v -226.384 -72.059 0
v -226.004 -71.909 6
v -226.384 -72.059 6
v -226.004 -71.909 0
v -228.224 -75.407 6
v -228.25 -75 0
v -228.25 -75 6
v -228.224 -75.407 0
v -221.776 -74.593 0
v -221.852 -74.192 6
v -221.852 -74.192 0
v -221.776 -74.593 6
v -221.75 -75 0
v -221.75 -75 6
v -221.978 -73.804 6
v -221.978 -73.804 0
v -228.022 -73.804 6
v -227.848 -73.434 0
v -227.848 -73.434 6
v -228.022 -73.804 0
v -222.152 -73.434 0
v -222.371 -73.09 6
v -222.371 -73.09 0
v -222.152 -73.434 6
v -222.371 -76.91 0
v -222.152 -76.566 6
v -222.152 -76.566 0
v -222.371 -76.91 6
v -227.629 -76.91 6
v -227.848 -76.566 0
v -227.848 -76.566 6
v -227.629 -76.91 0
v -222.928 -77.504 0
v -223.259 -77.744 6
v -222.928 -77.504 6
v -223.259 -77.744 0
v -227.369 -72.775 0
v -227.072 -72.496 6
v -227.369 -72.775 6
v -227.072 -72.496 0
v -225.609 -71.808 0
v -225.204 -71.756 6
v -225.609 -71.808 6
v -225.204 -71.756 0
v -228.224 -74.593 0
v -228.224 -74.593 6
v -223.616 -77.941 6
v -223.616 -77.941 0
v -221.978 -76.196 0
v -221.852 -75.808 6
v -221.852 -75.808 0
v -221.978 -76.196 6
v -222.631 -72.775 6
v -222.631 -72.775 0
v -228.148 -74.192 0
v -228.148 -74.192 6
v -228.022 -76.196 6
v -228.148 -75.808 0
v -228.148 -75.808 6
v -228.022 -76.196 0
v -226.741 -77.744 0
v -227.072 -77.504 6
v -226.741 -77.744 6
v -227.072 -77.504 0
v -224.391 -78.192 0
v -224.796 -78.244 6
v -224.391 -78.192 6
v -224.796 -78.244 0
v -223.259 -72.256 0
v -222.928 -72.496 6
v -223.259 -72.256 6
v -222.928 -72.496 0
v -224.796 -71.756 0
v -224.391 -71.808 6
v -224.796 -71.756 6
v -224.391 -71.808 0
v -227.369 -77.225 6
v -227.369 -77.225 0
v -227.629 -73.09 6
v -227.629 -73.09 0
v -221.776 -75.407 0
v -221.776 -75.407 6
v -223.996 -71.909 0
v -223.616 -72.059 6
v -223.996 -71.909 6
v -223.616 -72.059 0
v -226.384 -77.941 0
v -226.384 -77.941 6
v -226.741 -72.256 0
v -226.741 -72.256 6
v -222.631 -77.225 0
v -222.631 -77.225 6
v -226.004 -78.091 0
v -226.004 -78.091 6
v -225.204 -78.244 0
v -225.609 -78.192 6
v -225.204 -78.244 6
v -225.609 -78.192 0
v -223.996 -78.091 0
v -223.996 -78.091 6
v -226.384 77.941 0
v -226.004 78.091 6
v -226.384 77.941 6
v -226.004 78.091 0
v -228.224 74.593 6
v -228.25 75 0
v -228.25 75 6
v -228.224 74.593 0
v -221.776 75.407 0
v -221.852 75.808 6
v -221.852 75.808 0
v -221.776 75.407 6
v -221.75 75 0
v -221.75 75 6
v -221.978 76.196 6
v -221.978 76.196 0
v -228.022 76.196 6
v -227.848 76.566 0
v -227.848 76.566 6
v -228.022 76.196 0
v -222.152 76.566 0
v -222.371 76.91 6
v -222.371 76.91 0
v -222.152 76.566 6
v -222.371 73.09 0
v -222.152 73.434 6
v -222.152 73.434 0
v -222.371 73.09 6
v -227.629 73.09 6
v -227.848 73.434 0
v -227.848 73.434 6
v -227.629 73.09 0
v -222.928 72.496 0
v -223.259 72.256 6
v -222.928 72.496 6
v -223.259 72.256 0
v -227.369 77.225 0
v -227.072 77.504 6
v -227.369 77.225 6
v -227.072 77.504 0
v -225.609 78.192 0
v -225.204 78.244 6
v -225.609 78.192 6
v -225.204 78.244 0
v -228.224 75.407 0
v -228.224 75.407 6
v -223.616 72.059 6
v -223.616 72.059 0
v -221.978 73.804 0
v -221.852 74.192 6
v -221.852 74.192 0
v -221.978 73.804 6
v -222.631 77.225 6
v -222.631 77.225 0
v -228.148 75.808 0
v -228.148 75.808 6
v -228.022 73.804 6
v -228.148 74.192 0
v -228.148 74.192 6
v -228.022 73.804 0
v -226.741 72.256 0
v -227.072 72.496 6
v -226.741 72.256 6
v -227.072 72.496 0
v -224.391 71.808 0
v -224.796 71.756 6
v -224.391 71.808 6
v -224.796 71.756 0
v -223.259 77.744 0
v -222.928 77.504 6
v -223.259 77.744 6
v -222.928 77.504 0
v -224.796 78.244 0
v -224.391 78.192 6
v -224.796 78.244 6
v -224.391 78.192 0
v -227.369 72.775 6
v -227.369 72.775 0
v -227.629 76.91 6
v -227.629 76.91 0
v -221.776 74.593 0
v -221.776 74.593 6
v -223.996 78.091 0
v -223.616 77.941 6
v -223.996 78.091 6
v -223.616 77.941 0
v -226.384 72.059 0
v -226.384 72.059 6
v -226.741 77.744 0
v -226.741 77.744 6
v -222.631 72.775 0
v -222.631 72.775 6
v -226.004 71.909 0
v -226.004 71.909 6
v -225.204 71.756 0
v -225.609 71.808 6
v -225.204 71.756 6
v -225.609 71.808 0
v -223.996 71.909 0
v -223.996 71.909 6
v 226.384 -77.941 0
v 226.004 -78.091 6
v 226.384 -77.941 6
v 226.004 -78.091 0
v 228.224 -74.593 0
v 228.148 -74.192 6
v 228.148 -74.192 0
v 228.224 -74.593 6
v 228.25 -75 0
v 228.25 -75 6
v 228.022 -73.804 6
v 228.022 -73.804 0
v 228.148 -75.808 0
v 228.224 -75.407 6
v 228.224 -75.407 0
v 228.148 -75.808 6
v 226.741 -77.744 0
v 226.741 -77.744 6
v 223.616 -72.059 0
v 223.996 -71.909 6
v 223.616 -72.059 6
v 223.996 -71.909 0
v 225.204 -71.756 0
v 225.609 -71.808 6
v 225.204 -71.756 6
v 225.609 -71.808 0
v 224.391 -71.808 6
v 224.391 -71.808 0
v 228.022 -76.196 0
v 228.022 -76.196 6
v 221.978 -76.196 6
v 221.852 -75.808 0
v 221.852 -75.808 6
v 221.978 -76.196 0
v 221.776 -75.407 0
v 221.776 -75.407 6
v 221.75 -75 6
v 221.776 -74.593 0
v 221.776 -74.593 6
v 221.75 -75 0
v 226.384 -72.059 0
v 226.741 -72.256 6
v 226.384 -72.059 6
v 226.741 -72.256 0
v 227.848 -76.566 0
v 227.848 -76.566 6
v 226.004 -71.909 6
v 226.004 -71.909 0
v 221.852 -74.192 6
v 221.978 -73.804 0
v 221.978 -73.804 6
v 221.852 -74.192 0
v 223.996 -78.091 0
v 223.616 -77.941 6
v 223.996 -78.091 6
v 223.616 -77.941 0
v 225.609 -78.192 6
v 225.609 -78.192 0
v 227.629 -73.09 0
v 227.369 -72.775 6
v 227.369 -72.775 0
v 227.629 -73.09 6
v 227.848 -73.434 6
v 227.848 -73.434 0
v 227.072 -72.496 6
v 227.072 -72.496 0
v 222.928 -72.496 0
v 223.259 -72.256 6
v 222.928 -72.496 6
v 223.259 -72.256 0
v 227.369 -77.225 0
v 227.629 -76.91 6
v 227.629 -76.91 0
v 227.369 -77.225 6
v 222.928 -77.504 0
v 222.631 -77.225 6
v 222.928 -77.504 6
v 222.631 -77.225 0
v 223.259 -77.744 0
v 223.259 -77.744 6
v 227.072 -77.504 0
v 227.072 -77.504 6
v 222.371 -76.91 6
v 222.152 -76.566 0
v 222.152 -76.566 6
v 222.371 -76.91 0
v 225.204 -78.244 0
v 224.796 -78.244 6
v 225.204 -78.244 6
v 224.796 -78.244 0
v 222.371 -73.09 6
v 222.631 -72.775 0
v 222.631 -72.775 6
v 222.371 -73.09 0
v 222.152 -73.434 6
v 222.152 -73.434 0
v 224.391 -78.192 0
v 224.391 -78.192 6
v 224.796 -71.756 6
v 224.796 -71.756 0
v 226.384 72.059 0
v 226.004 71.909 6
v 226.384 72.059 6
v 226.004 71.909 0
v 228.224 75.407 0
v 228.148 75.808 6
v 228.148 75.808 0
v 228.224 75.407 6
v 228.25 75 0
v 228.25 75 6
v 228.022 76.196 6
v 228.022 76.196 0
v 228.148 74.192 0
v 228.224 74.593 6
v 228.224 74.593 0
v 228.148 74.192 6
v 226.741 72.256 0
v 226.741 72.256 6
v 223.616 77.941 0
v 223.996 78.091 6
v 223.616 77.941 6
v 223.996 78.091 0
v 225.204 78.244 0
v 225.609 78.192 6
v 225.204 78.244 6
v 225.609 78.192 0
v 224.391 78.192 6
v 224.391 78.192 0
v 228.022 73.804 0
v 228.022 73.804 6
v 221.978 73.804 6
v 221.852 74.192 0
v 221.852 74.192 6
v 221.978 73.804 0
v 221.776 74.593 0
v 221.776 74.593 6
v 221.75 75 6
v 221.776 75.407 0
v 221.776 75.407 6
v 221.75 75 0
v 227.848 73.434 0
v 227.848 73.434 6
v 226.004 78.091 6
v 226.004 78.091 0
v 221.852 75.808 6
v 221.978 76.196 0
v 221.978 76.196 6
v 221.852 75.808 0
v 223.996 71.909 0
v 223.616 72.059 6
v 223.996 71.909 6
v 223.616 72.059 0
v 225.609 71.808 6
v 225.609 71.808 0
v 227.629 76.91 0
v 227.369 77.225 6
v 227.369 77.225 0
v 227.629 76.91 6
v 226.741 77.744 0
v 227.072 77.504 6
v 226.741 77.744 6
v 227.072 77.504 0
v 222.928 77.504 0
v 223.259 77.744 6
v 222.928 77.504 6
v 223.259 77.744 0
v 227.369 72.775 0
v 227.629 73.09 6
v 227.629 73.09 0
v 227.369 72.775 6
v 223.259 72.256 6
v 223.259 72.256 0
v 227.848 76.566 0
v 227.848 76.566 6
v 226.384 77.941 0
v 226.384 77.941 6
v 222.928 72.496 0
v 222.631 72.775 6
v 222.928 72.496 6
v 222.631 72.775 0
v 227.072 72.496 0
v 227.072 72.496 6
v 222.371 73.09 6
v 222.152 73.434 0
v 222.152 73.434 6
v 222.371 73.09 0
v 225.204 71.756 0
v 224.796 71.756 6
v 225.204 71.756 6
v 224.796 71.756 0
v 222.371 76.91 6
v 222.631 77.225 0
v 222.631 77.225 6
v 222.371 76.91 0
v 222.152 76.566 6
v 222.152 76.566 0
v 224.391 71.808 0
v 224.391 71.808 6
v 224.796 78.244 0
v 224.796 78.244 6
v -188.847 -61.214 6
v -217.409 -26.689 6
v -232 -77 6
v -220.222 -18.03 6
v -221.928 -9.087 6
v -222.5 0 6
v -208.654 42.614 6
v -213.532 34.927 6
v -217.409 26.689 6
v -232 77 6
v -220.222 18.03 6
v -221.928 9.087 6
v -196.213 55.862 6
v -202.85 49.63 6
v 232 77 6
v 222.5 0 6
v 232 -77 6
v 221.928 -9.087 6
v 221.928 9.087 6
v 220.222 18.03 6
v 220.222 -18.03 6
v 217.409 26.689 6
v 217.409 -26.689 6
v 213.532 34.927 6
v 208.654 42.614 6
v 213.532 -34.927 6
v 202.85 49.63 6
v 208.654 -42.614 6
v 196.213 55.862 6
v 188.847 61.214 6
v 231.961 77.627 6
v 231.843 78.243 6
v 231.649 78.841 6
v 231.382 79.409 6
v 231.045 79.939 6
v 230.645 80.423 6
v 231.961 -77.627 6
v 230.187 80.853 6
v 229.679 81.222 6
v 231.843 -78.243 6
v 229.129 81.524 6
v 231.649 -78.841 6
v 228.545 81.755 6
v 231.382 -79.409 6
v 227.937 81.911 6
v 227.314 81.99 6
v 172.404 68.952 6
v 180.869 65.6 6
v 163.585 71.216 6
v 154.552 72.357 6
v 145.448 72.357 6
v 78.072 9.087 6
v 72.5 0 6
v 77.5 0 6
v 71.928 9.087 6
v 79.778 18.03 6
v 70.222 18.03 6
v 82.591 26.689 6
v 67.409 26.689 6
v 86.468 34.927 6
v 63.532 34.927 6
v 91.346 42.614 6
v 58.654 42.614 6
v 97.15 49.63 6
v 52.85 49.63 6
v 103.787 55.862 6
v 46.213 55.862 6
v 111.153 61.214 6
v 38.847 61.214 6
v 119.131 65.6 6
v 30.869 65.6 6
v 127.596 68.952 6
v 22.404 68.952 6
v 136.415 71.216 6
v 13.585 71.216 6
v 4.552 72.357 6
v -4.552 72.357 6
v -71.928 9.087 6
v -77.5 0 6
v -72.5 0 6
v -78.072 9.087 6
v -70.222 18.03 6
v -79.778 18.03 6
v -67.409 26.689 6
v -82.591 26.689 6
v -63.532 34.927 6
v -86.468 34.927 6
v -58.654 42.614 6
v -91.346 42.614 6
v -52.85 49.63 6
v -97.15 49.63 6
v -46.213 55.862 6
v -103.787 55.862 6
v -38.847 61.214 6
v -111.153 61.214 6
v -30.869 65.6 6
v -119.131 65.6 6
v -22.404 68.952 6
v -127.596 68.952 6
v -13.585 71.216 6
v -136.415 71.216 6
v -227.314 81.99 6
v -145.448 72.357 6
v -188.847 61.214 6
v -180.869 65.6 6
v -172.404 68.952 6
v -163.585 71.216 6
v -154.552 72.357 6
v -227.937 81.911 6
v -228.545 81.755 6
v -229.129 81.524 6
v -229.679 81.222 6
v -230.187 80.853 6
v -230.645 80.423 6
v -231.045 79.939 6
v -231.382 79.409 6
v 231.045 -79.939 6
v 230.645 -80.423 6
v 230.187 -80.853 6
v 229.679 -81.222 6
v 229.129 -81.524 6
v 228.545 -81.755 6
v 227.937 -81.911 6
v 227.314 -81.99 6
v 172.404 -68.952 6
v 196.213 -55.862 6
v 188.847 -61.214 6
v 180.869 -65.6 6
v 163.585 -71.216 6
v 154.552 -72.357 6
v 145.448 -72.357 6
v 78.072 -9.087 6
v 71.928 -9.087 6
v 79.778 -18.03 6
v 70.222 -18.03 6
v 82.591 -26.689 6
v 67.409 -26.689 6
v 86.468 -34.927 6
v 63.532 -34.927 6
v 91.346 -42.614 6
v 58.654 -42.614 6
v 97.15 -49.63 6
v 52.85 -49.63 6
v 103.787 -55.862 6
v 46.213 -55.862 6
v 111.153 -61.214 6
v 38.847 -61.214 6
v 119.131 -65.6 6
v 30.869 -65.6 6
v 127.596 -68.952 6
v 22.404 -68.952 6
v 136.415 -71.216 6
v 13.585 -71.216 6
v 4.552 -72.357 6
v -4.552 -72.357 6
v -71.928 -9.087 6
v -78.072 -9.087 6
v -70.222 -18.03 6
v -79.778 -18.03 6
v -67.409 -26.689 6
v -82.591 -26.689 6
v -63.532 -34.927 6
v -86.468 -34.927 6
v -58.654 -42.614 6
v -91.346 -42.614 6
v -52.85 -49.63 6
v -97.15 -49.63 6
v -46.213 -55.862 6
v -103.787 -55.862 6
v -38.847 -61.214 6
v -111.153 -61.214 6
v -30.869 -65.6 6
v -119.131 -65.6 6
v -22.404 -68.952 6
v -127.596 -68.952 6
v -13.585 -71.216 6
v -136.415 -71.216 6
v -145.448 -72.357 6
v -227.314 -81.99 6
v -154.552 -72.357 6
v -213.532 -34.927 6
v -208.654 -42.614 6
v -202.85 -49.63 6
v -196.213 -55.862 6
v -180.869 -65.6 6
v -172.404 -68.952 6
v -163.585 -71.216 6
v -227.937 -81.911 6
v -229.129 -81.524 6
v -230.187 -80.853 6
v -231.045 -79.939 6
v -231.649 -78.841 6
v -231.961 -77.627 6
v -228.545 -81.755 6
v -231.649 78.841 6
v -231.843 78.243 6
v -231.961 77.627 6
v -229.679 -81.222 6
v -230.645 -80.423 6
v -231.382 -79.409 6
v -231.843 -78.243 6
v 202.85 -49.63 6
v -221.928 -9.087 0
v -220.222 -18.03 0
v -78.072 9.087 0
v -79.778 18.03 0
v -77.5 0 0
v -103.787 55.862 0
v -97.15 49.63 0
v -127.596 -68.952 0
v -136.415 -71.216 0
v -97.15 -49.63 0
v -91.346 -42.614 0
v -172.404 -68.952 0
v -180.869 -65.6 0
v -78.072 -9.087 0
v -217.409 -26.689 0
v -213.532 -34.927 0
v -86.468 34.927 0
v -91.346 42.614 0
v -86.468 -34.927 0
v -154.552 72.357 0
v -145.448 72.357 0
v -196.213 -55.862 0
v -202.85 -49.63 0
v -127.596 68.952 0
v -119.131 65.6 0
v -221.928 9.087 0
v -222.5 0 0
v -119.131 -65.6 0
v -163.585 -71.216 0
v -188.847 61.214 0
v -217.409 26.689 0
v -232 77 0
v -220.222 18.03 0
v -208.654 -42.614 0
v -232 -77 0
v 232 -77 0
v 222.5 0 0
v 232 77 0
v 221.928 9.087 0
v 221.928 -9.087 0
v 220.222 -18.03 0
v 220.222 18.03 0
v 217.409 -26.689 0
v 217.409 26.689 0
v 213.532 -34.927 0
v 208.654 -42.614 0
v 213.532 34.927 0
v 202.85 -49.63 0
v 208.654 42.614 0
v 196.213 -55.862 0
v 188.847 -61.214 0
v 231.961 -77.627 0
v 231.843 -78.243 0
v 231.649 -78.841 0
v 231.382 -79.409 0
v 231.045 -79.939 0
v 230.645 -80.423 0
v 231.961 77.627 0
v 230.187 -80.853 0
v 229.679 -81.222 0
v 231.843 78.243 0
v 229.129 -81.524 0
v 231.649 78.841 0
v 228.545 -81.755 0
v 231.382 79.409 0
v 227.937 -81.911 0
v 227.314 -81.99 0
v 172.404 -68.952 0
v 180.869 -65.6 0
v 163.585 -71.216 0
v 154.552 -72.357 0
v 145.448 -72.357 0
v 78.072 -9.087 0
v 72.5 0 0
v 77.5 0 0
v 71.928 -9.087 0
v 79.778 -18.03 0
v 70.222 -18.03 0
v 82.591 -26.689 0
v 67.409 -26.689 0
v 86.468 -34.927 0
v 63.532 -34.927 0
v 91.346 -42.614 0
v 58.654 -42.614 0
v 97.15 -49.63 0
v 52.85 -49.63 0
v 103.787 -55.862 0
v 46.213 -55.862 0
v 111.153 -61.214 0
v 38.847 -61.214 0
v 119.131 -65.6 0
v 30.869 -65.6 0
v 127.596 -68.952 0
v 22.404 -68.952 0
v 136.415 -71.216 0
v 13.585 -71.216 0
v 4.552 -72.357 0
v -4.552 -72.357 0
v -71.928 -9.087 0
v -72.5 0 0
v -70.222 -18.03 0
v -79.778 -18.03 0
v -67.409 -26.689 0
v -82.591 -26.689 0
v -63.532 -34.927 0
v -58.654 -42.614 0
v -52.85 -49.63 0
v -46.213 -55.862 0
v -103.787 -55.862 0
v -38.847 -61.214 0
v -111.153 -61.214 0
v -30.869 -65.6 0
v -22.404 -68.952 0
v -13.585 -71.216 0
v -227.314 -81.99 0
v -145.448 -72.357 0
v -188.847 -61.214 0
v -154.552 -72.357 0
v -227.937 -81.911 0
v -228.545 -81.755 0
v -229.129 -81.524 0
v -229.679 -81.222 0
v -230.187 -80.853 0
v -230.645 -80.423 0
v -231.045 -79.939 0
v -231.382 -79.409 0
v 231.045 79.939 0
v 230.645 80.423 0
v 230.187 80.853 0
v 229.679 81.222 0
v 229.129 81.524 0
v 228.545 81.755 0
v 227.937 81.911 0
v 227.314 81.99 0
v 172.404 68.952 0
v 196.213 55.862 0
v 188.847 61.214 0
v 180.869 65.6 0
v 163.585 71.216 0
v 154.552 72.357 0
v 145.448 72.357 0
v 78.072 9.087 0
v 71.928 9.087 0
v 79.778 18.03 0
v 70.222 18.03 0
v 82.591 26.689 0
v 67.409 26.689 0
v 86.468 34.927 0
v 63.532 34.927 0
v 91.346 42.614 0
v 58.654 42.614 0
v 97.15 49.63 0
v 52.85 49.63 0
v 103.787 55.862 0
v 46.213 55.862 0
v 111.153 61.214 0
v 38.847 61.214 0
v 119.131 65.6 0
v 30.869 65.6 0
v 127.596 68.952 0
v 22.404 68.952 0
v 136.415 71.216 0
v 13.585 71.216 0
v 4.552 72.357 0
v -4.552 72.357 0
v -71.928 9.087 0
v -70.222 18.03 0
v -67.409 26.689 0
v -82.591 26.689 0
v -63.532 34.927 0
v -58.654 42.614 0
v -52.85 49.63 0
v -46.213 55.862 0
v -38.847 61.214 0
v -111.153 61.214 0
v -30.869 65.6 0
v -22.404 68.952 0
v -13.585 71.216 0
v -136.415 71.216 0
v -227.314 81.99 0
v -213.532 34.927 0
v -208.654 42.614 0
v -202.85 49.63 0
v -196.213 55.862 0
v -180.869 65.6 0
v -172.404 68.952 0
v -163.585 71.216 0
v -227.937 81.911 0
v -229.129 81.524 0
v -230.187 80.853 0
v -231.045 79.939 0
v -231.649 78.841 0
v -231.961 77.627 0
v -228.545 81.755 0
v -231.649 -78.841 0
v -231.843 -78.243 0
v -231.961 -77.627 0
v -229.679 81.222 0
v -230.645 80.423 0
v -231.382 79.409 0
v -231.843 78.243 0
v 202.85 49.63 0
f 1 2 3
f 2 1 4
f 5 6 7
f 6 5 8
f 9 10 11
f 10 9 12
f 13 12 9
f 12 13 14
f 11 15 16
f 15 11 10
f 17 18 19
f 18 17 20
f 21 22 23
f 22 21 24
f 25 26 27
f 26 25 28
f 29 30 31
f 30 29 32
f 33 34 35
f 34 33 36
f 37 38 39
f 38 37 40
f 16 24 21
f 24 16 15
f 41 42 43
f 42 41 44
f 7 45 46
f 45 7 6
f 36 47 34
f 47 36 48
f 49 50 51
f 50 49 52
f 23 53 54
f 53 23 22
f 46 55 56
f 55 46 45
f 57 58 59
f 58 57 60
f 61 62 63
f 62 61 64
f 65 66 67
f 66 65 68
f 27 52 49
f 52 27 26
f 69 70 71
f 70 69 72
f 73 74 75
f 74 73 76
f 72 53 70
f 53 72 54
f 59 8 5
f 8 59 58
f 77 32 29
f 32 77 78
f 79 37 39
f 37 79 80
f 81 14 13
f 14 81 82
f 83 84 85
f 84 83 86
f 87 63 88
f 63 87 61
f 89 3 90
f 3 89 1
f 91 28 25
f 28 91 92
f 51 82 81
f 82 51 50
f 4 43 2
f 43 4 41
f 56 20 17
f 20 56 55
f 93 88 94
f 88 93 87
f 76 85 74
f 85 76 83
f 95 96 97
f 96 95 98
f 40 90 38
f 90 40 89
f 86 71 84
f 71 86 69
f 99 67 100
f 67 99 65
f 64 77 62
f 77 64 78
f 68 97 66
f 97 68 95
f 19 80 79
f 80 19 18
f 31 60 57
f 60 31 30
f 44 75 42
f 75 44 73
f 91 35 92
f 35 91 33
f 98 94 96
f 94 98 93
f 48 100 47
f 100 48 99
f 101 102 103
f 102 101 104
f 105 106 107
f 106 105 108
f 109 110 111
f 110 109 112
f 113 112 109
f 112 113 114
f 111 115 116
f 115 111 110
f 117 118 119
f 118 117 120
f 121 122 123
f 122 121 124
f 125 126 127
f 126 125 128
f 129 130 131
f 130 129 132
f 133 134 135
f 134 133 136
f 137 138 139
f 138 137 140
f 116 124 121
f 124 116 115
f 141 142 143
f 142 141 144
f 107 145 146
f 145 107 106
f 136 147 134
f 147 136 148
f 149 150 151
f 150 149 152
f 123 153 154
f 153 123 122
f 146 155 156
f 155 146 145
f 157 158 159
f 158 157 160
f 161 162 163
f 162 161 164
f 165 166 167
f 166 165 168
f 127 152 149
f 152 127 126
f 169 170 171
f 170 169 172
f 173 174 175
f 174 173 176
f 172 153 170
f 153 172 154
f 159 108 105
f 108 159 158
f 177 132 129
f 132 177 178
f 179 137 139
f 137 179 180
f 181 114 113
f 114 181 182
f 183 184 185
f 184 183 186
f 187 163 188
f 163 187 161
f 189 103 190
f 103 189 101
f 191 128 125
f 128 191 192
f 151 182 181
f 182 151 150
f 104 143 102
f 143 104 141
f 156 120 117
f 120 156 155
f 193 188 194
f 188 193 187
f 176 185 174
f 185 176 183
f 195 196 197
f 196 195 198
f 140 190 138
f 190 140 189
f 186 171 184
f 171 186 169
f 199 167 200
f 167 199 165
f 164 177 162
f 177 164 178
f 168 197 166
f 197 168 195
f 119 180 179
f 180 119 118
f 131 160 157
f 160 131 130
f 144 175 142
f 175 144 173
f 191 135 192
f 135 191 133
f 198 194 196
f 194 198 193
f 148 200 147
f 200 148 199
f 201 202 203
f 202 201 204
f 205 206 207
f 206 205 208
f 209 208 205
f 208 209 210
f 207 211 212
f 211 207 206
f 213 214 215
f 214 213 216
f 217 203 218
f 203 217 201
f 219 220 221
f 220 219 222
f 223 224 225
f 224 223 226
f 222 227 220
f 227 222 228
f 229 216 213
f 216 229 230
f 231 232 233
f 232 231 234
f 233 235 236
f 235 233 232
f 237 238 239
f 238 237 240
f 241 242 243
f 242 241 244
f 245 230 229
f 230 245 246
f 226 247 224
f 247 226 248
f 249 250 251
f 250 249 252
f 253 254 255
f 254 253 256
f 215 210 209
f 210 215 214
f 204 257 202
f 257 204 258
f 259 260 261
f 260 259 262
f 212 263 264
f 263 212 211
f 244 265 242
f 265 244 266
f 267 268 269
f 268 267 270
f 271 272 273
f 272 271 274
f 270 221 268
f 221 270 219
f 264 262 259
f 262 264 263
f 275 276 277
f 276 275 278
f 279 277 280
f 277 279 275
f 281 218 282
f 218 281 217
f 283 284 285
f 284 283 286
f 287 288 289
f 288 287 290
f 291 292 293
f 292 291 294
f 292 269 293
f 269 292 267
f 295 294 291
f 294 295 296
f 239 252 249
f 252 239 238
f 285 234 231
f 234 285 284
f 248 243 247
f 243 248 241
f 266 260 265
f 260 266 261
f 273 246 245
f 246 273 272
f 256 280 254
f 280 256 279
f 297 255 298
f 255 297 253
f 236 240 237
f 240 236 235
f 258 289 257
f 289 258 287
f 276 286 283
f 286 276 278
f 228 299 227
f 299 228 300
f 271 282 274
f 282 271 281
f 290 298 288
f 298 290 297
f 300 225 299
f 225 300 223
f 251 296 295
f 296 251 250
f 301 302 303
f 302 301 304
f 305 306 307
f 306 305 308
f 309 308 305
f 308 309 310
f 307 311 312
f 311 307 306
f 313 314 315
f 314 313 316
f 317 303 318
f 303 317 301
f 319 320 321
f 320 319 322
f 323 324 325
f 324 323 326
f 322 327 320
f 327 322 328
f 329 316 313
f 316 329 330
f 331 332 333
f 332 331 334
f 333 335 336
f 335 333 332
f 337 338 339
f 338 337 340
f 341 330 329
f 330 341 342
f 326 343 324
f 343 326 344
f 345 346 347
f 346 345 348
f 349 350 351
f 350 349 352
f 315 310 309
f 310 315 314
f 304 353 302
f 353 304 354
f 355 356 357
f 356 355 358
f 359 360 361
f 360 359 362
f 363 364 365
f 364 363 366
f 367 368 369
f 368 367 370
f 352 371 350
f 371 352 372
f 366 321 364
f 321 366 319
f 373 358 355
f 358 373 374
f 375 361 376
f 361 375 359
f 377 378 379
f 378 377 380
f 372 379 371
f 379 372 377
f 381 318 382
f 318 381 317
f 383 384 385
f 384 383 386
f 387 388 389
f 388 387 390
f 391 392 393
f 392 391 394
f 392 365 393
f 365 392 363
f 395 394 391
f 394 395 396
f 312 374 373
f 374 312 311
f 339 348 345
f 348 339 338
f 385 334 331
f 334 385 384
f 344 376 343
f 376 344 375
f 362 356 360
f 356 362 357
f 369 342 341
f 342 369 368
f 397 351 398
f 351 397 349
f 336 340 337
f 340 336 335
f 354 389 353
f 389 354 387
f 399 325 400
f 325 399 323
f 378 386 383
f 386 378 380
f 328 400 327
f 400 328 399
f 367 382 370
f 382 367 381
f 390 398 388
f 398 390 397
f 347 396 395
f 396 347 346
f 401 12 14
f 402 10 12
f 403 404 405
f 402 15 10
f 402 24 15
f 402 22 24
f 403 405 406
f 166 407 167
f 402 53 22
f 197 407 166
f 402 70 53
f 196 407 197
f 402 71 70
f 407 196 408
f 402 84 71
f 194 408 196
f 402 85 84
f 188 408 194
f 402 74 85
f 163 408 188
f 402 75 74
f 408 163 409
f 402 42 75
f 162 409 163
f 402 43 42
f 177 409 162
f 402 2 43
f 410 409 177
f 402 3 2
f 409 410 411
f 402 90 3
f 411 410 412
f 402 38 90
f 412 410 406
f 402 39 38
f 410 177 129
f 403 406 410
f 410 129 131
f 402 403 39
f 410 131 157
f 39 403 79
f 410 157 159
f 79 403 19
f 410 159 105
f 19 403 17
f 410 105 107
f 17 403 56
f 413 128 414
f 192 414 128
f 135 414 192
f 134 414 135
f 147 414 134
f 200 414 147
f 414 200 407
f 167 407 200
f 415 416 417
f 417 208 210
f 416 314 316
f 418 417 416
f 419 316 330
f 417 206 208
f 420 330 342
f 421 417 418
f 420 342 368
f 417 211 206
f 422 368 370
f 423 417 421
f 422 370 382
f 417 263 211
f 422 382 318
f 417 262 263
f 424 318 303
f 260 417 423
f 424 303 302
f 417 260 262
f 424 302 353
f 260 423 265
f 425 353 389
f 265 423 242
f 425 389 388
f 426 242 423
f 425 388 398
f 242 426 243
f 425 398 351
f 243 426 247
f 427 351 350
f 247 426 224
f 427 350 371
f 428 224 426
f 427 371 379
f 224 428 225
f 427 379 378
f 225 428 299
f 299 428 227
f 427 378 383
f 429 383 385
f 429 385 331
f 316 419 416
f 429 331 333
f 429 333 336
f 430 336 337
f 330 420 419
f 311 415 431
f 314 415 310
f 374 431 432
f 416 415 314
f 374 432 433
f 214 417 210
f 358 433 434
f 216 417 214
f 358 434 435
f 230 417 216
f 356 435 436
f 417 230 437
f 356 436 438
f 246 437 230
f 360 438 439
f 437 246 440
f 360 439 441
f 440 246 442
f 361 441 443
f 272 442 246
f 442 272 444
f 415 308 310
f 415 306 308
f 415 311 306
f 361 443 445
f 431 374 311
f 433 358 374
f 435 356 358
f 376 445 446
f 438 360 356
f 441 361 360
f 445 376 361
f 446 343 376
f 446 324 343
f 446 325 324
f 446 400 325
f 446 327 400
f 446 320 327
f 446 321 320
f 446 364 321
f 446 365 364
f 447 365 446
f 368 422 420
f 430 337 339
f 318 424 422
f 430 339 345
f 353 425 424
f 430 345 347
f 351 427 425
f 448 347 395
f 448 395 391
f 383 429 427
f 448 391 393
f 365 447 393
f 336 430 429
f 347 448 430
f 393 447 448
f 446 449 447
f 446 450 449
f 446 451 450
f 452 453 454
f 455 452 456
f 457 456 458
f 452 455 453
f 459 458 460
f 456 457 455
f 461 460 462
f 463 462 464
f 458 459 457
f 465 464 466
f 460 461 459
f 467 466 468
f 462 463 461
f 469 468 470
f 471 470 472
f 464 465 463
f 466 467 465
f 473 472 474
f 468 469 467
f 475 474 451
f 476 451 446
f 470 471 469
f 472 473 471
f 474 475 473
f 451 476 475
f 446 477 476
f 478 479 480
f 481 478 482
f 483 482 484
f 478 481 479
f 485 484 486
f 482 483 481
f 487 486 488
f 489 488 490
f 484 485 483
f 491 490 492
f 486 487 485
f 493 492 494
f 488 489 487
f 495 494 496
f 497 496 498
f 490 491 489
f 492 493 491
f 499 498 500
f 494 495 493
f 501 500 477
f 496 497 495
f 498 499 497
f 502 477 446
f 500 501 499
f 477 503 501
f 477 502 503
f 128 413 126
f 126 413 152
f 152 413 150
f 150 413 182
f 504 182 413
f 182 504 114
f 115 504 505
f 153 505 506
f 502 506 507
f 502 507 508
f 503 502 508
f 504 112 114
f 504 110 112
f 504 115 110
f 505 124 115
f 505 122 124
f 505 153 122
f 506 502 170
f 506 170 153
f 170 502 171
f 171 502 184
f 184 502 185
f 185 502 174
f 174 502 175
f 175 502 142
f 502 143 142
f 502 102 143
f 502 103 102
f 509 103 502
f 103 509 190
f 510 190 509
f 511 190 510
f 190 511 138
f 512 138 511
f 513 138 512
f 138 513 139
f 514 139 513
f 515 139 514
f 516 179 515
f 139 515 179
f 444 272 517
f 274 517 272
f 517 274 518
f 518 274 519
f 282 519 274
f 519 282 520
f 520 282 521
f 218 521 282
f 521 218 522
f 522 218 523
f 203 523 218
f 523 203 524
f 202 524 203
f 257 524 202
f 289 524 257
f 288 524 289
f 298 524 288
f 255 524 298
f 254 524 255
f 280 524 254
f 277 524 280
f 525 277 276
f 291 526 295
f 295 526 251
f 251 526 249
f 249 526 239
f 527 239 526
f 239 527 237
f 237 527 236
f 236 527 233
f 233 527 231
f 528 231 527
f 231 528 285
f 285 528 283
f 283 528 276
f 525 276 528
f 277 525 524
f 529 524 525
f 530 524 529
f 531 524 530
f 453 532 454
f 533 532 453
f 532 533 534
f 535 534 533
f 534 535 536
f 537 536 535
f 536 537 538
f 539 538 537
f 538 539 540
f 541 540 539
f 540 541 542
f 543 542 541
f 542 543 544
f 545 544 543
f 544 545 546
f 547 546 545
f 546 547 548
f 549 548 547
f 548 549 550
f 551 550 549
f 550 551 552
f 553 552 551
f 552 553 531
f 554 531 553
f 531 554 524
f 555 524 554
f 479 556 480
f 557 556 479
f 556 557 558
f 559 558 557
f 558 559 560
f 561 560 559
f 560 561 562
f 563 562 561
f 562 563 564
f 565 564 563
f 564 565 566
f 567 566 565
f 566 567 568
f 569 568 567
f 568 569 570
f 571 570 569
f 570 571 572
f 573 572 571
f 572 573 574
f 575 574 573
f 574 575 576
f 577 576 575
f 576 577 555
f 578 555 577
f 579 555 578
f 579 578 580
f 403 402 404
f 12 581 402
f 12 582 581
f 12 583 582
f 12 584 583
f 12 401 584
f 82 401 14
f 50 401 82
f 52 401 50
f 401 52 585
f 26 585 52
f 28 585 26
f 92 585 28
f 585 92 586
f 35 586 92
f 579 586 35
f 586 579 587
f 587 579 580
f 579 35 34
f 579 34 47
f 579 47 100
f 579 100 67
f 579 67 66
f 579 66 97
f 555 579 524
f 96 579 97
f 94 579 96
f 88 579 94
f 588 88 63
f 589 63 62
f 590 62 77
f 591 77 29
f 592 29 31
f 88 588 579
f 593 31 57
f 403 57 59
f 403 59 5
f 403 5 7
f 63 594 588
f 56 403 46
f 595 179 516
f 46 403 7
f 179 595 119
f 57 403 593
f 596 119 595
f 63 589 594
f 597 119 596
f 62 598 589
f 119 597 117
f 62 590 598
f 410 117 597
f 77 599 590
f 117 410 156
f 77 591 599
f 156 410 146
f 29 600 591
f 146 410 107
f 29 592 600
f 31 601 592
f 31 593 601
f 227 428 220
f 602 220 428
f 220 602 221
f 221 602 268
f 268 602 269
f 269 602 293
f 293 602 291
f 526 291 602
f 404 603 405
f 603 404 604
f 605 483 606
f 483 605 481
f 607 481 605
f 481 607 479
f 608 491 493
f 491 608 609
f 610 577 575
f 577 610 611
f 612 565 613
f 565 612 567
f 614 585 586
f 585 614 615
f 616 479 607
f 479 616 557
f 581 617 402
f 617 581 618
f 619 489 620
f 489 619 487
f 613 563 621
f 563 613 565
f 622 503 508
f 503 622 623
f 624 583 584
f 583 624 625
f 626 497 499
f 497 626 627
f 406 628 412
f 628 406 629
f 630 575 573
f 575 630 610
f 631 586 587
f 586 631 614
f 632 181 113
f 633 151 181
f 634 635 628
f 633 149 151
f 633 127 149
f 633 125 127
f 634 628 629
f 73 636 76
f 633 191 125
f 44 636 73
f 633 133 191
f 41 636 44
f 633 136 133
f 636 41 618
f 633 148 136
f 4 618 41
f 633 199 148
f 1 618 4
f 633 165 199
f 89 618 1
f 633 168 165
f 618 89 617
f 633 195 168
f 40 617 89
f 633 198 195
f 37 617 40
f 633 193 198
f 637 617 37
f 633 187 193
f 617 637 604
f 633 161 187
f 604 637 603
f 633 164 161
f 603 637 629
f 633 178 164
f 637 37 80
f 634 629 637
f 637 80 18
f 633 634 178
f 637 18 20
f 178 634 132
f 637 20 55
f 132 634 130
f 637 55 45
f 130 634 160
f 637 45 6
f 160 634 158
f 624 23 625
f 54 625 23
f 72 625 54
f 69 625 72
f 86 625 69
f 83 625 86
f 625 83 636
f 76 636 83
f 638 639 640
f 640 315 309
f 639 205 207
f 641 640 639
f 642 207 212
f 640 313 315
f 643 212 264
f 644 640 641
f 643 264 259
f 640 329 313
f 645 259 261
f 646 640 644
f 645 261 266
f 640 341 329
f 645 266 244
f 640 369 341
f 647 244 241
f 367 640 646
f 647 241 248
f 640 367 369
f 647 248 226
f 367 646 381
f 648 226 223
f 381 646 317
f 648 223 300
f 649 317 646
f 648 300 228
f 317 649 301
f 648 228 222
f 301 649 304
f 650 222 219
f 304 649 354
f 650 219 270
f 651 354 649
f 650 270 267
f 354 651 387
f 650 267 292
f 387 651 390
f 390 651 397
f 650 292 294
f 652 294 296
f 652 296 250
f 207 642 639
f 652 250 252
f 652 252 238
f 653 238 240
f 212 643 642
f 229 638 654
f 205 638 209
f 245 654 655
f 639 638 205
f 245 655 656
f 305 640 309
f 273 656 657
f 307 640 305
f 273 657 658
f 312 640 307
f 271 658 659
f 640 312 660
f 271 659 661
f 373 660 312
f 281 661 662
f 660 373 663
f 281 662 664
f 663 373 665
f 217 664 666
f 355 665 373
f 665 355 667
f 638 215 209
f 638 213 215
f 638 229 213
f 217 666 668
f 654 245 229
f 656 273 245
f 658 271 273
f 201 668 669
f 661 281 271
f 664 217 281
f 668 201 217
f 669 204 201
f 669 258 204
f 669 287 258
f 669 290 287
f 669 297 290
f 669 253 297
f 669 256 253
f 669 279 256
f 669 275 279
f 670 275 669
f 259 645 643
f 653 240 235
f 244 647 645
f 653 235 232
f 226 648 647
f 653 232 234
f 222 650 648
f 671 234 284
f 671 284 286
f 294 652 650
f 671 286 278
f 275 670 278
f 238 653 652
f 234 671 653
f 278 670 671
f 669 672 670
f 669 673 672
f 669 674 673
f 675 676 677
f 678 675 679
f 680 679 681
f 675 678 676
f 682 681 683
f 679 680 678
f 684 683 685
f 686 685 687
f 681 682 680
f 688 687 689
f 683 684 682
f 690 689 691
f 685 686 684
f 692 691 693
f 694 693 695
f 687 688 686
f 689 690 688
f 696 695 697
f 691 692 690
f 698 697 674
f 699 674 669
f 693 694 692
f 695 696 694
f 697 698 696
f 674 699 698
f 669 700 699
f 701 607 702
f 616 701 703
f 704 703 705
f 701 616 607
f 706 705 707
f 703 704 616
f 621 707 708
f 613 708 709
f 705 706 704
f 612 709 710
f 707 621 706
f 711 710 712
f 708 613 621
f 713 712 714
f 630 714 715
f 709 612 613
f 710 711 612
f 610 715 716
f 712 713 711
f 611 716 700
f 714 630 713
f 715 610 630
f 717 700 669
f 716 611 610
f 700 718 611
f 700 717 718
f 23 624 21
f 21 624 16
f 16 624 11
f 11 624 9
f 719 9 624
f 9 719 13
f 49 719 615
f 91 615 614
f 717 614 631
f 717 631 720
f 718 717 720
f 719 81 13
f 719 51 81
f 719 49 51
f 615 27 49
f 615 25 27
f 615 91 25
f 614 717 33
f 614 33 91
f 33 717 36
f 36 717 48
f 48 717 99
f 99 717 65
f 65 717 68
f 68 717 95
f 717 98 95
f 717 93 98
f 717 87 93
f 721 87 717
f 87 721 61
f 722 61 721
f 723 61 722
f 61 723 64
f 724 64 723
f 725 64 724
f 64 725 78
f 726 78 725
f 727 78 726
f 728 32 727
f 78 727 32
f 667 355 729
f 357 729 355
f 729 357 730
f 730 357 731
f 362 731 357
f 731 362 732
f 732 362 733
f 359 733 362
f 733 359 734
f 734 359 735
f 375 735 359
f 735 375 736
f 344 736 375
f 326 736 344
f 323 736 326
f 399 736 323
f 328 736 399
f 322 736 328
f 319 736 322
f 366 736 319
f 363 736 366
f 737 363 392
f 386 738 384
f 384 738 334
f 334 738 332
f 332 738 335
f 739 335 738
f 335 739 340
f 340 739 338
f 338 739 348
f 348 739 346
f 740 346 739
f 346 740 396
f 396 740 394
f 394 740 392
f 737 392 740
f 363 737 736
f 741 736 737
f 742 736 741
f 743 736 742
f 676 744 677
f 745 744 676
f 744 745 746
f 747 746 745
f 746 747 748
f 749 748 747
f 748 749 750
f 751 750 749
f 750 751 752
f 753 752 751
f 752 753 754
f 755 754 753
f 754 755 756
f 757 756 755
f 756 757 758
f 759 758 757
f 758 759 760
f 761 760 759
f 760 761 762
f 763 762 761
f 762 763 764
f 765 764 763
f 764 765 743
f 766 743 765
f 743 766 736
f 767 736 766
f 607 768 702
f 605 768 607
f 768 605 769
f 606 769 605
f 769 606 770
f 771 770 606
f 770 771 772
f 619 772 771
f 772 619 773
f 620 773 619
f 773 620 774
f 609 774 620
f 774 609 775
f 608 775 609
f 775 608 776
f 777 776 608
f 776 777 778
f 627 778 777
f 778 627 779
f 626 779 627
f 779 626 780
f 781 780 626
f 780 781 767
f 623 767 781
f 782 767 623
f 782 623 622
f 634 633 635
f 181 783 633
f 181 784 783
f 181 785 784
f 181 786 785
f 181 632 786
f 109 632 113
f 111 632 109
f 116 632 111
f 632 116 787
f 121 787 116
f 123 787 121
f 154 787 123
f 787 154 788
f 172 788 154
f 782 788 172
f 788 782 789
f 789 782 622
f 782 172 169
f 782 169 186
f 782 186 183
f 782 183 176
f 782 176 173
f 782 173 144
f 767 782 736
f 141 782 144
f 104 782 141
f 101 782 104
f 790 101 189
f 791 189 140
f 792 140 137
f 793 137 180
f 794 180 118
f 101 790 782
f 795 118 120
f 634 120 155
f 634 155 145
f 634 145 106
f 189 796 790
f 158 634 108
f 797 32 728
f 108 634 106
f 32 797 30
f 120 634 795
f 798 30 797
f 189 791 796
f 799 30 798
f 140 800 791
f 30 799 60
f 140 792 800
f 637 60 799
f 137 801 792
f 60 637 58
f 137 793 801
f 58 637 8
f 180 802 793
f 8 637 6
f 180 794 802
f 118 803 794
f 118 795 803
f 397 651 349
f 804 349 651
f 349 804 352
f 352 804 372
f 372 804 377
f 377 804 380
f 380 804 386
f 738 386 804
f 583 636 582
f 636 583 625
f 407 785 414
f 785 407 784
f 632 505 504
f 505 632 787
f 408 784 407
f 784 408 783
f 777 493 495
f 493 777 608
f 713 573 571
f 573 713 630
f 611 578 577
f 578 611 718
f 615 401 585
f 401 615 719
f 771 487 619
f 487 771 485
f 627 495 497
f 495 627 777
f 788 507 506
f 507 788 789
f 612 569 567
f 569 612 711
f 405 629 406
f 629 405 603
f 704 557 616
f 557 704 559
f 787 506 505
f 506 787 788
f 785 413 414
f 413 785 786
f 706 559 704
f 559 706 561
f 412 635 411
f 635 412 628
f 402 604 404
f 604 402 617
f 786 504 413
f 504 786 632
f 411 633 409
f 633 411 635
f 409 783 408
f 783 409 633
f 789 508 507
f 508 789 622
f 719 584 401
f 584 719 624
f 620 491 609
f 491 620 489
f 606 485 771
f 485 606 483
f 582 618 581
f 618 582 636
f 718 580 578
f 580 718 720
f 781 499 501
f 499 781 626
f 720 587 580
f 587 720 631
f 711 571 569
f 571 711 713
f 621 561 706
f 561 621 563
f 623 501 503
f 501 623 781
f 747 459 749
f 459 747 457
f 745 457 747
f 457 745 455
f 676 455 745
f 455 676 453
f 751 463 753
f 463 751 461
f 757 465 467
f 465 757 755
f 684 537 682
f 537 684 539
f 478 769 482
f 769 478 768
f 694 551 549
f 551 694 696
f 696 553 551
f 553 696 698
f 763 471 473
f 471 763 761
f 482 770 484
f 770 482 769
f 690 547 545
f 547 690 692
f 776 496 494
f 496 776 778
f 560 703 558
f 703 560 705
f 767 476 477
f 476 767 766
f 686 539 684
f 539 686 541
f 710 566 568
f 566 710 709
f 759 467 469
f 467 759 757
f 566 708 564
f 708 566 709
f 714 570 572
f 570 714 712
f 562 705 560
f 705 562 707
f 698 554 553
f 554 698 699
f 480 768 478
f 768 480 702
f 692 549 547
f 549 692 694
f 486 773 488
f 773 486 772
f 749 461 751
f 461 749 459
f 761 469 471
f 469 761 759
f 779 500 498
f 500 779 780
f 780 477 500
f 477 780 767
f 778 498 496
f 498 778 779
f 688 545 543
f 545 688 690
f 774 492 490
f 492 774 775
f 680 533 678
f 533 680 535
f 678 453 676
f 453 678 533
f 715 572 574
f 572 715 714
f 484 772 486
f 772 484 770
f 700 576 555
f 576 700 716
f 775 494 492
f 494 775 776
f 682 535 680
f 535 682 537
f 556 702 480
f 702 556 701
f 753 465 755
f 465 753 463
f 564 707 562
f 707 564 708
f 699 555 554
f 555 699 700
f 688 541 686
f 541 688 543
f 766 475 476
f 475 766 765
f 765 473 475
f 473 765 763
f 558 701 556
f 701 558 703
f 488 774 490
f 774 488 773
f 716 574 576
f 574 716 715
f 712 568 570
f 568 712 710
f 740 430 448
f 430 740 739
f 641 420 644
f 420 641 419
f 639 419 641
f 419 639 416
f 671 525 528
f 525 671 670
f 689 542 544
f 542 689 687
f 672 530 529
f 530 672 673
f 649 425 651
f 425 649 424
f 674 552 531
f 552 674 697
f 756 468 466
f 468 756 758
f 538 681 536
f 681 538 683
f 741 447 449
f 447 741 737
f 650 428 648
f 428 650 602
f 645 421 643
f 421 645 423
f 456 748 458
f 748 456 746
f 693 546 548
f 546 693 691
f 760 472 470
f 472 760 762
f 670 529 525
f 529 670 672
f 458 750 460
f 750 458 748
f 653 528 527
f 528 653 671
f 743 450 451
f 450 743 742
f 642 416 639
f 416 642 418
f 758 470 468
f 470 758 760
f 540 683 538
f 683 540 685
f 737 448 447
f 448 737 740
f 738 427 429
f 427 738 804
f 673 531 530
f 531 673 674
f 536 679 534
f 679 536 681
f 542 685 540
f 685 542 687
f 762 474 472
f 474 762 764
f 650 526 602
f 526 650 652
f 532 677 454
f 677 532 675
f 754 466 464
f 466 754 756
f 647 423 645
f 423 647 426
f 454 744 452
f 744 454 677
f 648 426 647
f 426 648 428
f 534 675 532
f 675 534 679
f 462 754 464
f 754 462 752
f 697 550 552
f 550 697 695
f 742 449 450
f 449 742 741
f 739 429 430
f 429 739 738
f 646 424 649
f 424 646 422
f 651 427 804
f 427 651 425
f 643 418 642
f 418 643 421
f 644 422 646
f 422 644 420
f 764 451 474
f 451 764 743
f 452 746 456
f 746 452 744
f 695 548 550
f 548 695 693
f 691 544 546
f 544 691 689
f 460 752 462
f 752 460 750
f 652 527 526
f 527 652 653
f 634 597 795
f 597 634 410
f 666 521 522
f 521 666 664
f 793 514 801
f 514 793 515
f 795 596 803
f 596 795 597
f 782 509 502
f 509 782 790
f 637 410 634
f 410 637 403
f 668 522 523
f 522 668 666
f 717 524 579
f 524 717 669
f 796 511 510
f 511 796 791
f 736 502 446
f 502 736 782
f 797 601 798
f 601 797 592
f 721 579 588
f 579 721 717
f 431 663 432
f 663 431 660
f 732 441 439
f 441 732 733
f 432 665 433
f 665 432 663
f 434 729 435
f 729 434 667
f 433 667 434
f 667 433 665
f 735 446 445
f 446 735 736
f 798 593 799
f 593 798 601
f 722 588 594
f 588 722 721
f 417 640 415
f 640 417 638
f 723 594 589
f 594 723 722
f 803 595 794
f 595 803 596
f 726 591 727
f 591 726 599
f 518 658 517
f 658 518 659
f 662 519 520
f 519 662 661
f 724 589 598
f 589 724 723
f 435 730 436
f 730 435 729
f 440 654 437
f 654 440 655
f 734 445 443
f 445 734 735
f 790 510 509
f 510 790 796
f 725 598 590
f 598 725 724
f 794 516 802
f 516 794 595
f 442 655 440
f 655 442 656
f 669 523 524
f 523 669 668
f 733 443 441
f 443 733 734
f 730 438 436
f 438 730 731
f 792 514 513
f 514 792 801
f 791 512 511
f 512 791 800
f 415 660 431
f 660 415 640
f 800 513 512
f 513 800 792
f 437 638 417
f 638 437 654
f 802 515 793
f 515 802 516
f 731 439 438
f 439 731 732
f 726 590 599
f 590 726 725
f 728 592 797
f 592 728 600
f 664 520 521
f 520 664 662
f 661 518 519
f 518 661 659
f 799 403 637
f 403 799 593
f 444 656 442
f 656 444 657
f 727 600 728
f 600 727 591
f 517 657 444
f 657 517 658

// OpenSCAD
$fn = 50;

difference() {
	union() {
		hull() {
			translate(v = [-227.0, 77.0, 0]) {
				cylinder(h = 6, r = 5);
			}
			translate(v = [227.0, 77.0, 0]) {
				cylinder(h = 6, r = 5);
			}
			translate(v = [-227.0, -77.0, 0]) {
				cylinder(h = 6, r = 5);
			}
			translate(v = [227.0, -77.0, 0]) {
				cylinder(h = 6, r = 5);
			}
		}
	}
	union() {
		translate(v = [-225.0, -75.0, -100.0]) {
			cylinder(h = 200, r = 3.25);
		}
		translate(v = [-225.0, 75.0, -100.0]) {
			cylinder(h = 200, r = 3.25);
		}
		translate(v = [225.0, -75.0, -100.0]) {
			cylinder(h = 200, r = 3.25);
		}
		translate(v = [225.0, 75.0, -100.0]) {
			cylinder(h = 200, r = 3.25);
		}
		translate(v = [-225.0, -75.0, -100.0]) {
			cylinder(h = 200, r = 1.8);
		}
		translate(v = [-225.0, 75.0, -100.0]) {
			cylinder(h = 200, r = 1.8);
		}
		translate(v = [225.0, -75.0, -100.0]) {
			cylinder(h = 200, r = 1.8);
		}
		translate(v = [225.0, 75.0, -100.0]) {
			cylinder(h = 200, r = 1.8);
		}
		translate(v = [-150.0, 0, 0.0]) {
			cylinder(h = 6, r = 72.5);
		}
		cylinder(h = 6, r = 72.5);
		translate(v = [150.0, 0, 0.0]) {
			cylinder(h = 6, r = 72.5);
		}
	}
}
